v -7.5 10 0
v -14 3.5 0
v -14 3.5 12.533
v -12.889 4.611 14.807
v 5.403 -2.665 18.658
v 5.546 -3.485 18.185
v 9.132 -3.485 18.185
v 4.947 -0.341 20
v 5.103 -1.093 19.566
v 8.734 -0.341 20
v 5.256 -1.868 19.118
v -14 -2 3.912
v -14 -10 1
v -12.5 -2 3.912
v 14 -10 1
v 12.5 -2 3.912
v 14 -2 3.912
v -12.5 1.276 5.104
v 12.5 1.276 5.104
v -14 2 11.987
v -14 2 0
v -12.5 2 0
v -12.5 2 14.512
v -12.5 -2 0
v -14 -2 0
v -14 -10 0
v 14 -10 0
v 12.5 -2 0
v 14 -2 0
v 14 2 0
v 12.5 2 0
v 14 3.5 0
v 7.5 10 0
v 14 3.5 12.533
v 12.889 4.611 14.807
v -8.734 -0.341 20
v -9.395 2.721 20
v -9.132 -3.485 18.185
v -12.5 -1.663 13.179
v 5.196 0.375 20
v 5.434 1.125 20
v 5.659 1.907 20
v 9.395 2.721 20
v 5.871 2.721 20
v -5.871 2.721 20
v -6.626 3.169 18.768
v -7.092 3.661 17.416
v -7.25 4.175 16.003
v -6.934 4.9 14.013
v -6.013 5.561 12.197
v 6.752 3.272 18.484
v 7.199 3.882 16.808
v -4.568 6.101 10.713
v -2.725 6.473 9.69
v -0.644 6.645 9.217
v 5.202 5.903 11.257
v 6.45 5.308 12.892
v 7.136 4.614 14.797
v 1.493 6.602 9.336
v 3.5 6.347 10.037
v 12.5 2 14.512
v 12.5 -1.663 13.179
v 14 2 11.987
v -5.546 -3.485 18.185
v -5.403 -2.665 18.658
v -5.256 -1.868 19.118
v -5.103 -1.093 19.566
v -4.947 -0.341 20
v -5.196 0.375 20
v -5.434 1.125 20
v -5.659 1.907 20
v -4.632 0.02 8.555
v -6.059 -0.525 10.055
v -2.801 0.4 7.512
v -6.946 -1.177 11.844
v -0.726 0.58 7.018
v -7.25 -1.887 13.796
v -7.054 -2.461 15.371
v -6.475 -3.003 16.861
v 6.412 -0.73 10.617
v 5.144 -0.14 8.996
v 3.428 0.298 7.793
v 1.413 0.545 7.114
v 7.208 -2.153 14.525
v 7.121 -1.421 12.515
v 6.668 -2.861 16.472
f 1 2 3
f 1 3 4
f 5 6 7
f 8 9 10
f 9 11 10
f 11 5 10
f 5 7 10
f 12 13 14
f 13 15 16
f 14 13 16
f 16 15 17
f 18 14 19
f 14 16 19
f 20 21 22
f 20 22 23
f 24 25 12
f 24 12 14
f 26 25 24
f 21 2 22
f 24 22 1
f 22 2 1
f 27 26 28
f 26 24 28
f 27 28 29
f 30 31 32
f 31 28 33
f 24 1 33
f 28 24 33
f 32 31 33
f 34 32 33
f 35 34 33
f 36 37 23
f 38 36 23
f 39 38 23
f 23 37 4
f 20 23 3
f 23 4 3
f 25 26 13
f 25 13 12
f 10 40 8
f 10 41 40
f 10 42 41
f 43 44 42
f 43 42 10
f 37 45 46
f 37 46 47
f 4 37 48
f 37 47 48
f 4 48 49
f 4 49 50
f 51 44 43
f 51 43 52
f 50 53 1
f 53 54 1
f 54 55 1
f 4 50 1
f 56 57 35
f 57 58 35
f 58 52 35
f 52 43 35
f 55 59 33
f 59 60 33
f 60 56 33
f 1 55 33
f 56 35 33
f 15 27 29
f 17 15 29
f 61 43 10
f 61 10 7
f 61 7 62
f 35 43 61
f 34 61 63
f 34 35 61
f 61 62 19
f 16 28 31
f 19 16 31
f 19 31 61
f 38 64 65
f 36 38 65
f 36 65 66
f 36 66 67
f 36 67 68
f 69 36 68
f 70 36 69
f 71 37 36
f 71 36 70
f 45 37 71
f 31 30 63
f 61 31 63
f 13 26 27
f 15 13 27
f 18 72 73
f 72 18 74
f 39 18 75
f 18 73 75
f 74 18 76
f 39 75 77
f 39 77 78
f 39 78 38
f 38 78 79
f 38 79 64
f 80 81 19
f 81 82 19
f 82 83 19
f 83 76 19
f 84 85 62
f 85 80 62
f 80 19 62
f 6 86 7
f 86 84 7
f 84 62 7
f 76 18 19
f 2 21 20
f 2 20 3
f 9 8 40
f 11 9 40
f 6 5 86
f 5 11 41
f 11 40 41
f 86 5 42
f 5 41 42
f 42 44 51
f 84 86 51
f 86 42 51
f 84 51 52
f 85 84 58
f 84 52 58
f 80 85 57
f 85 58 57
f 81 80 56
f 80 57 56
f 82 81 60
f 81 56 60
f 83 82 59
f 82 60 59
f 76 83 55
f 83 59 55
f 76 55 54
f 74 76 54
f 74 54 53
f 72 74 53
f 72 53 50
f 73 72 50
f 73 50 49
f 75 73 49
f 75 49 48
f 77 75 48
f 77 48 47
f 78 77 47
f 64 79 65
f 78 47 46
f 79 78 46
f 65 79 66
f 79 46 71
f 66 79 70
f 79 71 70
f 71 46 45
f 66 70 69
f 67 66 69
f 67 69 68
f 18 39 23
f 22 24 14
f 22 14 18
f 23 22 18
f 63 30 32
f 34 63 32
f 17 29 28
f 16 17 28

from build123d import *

# Parameters (mm, degrees)
F0_W      = 28
F0_H      = 20
F1_DEPTH  = 20
F3_DEPTH  = 20
F6_DEPTH  = 17.5
F7_W      = 1.5
F7_H      = 4
F8_DEPTH  = 40
F12_DEPTH = 15
F15_D     = 14.5
F17_DEPTH = 20
F19_DEPTH = 12.5


with BuildPart() as f1:
    # F0 (on Top) → F1 (new body)
    with BuildSketch(Plane.XY):
        Rectangle(F0_W, F0_H)
    extrude(amount=F1_DEPTH)


with BuildPart() as f3:
    # F2 (on Top) → F3 (new body)
    with BuildSketch(Plane.XY):
        Polygon((-14, 3.5), (-7.5, 10), (-14, 10), align=None)
    extrude(amount=F3_DEPTH)


with BuildPart() as f4_1:
    # F4: instance of F3
    add(f3.part.mirror(Plane.YZ))


with BuildPart() as f6:
    # F5 (on Right) → F6 (new body, symmetric)
    with BuildSketch(Plane.YZ):
        Polygon((-0.083567, 27.704372), (10, 0), (10, 27.704372), align=None)
    extrude(amount=F6_DEPTH, both=True)


with BuildPart() as f8:
    # F7 (on Top) → F8 (new body)
    with BuildSketch(Plane.XY):
        with Locations((-13.25, 0)):
            Rectangle(F7_W, F7_H)
    extrude(amount=F8_DEPTH)


with BuildPart() as f9_1:
    # F9: instance of F8
    add(f8.part.mirror(Plane.YZ))


with BuildPart() as f1_1:
    add(f1.part)

    # F10: cut F3, F4_1, F6, F8, F9_1
    add(f3.part, mode=Mode.SUBTRACT)
    add(f4_1.part, mode=Mode.SUBTRACT)
    add(f6.part, mode=Mode.SUBTRACT)
    add(f8.part, mode=Mode.SUBTRACT)
    add(f9_1.part, mode=Mode.SUBTRACT)


with BuildPart() as f12:
    # F11 (on Right) → F12 (new body, symmetric)
    with BuildSketch(Plane.YZ):
        Polygon((-10, 36.085653), (-10, 1), (1.276311, 5.104242), align=None)
    extrude(amount=F12_DEPTH, both=True)


with BuildPart() as f1_2:
    add(f1_1.part)

    # F13: cut F12
    add(f12.part, mode=Mode.SUBTRACT)

    # F15 (through all)
    with Locations(Plane(origin=(0, 2.767483, 1.007281), x_dir=(1, 0, 0), z_dir=(0, -0.939693, -0.34202))):
        with Locations((0, 13.609894)):
            Hole(F15_D / 2)


with BuildPart() as f17:
    # F16 (on Right) → F17 (new body, symmetric)
    with BuildSketch(Plane.YZ):
        Polygon((-6.932441, 16.194142), (0, 20.196589), (-9.243255, 20.196589), align=None)
    extrude(amount=F17_DEPTH, both=True)


with BuildPart() as f19:
    # F18 (on face) → F19 (new body, symmetric)
    with BuildSketch(Plane(origin=(0, 8.830222, 3.213938), x_dir=(-1, 0, 0), z_dir=(0, 0.939693, 0.34202))):
        Polygon((14, 26.39773), (4, 26.39773), (14, 10.579799), align=None)
    extrude(amount=F19_DEPTH, both=True)


with BuildPart() as f20_1:
    # F20: instance of F19
    add(f19.part.mirror(Plane.YZ))


with BuildPart() as f1_3:
    add(f1_2.part)

    # F21: cut F20_1, F19, F17
    add(f20_1.part, mode=Mode.SUBTRACT)
    add(f19.part, mode=Mode.SUBTRACT)
    add(f17.part, mode=Mode.SUBTRACT)


solid = f1_3.part
